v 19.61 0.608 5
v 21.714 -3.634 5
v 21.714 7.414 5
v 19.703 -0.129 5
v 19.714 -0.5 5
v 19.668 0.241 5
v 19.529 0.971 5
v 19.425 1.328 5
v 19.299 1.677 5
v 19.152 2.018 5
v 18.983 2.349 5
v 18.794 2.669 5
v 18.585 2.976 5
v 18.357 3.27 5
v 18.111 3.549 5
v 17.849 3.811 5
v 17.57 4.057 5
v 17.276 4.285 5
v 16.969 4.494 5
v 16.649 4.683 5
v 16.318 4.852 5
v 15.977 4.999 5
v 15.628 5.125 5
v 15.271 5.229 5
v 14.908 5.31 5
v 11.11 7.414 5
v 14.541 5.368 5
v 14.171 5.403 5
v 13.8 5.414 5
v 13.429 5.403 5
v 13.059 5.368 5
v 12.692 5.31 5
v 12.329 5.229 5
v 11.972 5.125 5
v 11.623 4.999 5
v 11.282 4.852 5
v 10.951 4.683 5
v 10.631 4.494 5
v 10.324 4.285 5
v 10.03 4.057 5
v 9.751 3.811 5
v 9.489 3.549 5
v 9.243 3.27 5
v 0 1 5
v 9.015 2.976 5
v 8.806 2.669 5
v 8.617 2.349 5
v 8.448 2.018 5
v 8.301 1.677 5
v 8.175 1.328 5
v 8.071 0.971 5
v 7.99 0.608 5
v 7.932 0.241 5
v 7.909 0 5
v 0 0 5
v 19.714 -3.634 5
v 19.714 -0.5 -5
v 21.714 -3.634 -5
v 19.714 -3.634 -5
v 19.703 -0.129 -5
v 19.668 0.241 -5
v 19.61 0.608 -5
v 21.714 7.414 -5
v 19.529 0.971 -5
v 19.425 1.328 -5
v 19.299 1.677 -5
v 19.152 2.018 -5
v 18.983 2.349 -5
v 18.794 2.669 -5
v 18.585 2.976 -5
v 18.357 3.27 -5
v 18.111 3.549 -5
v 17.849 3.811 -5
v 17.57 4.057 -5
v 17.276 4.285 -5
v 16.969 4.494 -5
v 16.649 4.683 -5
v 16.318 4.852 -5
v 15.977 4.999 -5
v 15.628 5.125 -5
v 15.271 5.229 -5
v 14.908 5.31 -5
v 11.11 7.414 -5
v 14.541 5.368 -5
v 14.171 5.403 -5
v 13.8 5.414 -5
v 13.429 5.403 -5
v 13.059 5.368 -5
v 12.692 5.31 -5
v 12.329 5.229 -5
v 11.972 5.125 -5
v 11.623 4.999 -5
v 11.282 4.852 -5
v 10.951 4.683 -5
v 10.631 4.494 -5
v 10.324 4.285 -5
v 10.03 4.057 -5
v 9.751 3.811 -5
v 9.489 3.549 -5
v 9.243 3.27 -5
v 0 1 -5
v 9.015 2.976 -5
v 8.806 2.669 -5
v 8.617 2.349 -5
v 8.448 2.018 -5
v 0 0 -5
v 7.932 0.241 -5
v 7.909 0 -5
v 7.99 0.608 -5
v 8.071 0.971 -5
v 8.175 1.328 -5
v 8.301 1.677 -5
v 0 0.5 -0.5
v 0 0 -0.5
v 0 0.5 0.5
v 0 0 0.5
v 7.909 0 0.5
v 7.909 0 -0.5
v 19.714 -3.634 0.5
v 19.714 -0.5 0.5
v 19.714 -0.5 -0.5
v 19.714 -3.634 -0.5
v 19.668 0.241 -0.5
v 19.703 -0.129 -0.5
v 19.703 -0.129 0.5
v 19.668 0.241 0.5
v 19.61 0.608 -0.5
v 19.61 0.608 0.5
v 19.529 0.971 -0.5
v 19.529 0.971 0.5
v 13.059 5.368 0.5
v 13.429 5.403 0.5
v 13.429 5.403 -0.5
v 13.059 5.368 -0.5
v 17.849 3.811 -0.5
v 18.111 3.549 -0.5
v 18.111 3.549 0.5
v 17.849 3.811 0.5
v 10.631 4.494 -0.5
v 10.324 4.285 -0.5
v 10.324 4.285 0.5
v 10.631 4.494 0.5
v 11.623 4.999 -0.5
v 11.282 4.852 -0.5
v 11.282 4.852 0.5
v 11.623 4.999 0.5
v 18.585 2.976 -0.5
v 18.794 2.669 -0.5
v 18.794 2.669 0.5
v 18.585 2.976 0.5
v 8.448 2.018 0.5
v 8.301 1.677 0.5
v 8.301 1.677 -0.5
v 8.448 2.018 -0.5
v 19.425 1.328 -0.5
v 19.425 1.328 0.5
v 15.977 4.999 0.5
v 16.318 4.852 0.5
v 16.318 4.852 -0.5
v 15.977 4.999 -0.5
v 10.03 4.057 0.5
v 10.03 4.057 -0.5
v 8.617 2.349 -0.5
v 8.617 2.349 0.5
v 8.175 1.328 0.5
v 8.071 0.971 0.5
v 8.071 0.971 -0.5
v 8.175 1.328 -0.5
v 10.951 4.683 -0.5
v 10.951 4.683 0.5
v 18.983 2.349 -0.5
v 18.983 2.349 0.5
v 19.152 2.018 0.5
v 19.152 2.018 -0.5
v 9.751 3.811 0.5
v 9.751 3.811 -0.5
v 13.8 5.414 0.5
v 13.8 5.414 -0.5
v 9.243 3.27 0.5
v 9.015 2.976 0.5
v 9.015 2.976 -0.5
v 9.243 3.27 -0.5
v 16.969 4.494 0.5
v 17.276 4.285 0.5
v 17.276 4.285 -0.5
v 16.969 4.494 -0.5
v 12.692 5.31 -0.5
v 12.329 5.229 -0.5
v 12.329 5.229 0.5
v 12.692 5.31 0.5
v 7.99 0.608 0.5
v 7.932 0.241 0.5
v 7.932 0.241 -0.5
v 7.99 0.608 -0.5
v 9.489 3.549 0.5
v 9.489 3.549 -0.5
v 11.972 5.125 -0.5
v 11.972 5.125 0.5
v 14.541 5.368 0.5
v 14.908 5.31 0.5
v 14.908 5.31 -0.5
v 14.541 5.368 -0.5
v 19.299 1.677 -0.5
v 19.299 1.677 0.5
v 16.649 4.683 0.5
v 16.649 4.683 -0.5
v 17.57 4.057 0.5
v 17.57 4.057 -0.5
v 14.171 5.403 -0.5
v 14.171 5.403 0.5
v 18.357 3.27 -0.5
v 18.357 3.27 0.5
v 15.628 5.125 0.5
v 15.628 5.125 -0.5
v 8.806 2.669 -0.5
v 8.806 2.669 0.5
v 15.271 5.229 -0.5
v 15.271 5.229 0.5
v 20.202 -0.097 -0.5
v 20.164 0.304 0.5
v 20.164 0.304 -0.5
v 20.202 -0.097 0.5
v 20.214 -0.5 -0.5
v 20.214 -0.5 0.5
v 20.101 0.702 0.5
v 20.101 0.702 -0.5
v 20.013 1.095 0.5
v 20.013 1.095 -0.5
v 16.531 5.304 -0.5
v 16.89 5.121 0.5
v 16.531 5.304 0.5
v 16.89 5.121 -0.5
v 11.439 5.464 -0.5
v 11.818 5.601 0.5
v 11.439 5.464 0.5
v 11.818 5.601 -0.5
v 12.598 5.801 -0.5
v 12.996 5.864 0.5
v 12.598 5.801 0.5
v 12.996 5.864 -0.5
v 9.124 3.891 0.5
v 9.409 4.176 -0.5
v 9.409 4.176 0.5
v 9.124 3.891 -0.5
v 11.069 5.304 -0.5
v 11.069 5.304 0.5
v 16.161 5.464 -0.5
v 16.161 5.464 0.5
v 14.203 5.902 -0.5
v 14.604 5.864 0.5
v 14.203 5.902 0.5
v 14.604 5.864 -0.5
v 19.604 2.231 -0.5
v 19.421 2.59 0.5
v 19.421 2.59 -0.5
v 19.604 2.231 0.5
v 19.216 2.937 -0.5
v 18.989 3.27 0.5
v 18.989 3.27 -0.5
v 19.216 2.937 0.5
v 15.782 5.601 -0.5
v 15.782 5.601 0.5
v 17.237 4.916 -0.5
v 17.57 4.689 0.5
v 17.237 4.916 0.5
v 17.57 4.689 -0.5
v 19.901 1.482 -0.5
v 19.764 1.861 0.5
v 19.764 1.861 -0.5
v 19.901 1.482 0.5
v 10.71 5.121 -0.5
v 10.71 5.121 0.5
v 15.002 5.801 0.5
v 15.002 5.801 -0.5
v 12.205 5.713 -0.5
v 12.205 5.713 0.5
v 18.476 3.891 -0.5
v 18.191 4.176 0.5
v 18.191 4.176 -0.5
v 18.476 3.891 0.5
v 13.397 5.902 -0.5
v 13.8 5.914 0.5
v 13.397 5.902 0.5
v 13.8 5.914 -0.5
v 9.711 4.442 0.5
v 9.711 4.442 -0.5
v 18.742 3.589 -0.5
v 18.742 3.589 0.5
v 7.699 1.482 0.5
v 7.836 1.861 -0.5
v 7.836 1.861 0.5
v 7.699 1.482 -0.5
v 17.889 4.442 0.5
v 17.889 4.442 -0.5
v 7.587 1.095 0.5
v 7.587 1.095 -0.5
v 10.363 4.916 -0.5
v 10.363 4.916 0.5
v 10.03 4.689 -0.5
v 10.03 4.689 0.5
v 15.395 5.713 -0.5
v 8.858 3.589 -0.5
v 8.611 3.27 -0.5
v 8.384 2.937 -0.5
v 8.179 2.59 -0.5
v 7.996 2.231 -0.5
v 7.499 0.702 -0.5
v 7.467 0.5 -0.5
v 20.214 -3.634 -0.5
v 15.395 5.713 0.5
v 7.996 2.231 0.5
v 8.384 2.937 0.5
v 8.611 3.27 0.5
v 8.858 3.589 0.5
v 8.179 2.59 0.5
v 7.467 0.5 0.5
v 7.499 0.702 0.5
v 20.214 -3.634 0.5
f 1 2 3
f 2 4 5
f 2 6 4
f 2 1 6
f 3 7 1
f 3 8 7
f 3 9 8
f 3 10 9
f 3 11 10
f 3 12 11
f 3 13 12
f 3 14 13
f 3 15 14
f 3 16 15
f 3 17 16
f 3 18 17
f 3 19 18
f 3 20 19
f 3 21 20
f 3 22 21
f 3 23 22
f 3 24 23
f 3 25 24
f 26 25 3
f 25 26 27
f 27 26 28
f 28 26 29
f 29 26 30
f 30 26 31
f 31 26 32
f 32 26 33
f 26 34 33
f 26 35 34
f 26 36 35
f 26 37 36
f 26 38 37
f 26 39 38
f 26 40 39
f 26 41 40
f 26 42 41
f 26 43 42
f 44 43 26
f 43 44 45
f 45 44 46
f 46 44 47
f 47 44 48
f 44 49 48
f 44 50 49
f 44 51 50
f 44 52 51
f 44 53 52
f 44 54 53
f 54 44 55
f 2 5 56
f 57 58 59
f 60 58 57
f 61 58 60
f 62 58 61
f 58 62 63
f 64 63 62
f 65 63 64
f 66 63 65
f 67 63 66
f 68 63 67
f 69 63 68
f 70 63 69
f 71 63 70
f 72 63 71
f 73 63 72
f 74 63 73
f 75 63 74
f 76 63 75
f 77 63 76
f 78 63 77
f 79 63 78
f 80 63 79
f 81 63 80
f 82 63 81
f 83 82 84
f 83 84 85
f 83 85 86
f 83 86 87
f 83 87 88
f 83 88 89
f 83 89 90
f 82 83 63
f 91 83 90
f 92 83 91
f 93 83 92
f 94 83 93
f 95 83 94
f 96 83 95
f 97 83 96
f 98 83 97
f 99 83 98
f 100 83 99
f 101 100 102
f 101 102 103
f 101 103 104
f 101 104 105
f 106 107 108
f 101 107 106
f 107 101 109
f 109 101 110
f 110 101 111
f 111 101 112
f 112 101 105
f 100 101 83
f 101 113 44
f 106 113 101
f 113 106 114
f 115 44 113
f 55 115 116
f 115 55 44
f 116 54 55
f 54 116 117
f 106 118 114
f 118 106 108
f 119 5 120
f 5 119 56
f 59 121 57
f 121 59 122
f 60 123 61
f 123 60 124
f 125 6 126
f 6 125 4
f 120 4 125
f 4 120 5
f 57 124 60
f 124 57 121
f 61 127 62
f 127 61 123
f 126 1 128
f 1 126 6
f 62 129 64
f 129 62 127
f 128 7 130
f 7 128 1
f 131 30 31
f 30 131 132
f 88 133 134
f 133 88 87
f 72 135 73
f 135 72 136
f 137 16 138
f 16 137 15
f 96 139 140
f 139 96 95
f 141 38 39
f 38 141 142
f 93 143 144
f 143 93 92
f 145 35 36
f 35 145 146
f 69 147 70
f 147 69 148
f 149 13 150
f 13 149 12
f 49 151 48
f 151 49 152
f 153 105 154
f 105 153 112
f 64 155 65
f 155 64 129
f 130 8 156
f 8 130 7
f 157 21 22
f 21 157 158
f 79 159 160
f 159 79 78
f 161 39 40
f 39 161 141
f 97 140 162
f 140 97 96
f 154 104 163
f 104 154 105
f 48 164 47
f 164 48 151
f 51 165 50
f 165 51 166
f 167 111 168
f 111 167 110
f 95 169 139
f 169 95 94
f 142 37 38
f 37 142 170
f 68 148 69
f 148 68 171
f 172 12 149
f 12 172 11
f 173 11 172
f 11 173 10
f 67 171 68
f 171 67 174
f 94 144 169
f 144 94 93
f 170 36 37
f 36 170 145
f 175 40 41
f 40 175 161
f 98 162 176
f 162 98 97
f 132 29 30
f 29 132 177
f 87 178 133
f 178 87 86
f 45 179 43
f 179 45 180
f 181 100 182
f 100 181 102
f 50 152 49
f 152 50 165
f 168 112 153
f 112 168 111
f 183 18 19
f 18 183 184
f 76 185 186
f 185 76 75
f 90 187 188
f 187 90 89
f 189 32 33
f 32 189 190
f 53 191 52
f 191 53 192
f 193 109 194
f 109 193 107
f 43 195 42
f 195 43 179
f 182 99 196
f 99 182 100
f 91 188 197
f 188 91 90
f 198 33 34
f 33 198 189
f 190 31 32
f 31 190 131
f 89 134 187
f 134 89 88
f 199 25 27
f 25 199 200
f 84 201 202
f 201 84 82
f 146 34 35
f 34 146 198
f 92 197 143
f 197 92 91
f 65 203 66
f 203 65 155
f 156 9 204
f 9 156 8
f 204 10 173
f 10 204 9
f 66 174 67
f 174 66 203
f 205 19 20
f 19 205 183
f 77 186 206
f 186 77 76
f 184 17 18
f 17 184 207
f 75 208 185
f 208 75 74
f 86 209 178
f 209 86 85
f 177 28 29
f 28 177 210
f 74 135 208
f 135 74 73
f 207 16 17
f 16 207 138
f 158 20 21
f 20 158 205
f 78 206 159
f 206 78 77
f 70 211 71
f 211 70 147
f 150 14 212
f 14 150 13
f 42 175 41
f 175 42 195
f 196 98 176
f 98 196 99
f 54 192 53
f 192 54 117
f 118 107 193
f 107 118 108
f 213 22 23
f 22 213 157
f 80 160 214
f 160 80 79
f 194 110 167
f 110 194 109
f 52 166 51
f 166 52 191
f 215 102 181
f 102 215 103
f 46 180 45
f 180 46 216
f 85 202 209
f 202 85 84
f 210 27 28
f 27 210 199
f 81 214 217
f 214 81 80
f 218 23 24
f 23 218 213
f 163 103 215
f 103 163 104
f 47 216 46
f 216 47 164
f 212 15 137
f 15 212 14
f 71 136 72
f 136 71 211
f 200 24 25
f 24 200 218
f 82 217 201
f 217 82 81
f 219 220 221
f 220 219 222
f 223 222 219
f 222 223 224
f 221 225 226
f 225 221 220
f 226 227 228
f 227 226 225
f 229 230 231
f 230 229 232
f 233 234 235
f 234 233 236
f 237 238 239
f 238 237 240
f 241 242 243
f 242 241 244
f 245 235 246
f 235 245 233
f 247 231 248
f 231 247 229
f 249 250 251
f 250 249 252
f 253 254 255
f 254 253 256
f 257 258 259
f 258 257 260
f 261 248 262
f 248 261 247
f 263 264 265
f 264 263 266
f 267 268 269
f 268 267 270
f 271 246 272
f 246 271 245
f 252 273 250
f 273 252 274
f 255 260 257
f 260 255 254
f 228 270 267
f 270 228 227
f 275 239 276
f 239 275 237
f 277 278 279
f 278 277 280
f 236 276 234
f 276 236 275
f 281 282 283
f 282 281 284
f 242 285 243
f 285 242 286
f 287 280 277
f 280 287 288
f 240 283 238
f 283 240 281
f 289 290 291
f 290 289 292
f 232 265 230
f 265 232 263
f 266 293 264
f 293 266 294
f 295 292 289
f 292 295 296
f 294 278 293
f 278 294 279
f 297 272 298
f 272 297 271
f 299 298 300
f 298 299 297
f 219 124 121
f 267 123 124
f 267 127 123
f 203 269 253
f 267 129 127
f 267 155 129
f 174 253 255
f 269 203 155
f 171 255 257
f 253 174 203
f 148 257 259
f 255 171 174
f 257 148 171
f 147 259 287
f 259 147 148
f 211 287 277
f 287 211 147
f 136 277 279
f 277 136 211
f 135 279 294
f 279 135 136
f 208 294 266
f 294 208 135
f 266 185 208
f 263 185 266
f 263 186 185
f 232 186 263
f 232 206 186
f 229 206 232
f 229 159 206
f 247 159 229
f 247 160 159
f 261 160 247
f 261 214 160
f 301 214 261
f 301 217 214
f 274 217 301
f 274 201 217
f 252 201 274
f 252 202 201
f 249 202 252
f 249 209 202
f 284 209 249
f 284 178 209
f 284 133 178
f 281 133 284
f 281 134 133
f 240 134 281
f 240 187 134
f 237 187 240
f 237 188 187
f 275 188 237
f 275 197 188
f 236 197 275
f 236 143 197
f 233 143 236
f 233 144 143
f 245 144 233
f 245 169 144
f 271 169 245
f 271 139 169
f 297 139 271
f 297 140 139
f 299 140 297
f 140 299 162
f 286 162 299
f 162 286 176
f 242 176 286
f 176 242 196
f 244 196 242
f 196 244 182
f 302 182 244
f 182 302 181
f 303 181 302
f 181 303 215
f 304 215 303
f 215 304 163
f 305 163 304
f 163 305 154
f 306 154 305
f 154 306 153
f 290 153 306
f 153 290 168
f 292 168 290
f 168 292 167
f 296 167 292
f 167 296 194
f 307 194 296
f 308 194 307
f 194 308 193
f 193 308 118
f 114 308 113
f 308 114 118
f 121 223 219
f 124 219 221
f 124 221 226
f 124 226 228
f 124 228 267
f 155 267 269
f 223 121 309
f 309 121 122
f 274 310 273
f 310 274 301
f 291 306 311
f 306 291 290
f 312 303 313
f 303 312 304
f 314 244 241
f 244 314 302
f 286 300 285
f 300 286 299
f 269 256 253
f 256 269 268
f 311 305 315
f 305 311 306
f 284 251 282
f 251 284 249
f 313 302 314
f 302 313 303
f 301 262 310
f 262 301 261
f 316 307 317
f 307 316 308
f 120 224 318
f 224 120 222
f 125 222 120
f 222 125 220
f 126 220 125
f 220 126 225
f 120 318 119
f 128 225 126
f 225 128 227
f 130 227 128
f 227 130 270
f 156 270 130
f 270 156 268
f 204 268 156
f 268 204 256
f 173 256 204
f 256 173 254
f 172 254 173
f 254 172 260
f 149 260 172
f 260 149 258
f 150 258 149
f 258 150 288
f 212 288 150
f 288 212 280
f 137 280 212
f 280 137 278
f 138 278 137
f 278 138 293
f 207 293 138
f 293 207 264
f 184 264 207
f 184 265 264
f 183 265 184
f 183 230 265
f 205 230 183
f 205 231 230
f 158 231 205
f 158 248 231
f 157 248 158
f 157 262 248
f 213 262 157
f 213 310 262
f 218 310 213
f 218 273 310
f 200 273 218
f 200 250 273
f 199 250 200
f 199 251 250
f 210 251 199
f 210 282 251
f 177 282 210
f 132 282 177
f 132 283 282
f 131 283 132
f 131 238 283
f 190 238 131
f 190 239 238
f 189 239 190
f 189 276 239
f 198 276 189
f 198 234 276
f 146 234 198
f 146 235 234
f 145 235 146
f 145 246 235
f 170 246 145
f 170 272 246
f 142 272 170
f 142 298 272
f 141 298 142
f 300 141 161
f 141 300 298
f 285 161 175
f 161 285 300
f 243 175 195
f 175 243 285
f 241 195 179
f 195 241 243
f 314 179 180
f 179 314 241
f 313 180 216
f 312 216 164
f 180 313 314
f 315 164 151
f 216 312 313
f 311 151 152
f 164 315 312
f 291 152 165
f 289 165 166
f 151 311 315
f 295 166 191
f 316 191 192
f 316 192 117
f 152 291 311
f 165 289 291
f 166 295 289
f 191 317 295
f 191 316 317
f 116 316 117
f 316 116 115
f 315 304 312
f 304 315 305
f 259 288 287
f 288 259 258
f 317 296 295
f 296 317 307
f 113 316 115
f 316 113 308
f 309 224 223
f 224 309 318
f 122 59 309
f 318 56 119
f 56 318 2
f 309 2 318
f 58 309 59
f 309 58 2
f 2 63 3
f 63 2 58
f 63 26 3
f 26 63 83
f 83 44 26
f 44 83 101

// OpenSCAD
pliure  = 5;        // distance pour la pliure
fil     = 0.5;      // épaisseur des pattes
ecart   = 3;        // écart entre les pattes
anode   = 29.6;     // longueur de l'anode
cathode = 28.1;     // longueur de la cathode
espace  = 16.5;     // espace entre les leds
led     = 5.4;      // auteur de la led


//----------------------------------------------------------------------------------
// ICI C'EST LE PROGRAMME QUI GÈRE
//----------------------------------------------------------------------------------

//plieur1();

module plieur1() {
    difference() {
        // masse principale
        cube([anode,anode+2*ecart-pliure,pliure+fil]);
        
        // passage pattes verticale
        translate([ecart*2,ecart*2,0]) cube([fil*2,fil*2,10]);;
        translate([ecart*3,ecart*2,0]) cube([fil*2,fil*2,10]);;
        
        // guide pattes horizontales
        translate([ecart*3,ecart*2,pliure]) 
        cube([fil*2,anode-pliure,fil*2]);

        // guide pattes diagonale
        translate([ecart*3,ecart*2,pliure]) 
        rotate([0,0,-45])
        translate([-fil,fil,0])
        cube([fil*2,anode,fil*2]);
     }
 }
 
 module plieur2() {
    difference() {
        // masse principale
        cube([anode,anode+2*ecart-pliure,pliure+fil]);
        
        // passage pattes verticale
        translate([ecart*2,ecart*2,0]) cube([fil*2,fil*2,10]);;
        translate([ecart*3,ecart*2,0]) cube([fil*2,fil*2,10]);;
        
        // guide pattes horizontales
        translate([ecart*3,ecart*2,pliure]) 
        cube([fil*2,anode-pliure,fil*2]);

        // guide pattes diagonale
        translate([ecart*3,ecart*2,pliure]) 
        rotate([0,0,-45])
        translate([-fil,fil,0])
        cube([fil*2,anode,fil*2]);
        
        // coupe 
        cube([anode,2*ecart,pliure+fil]);
     }
 }
 

pi    = 3.14159265359;
marge = 3.13363;
rayon = (anode-marge-espace+led/2)/(pi-1);
reste =  espace - rayon - led/2;
epais = 10;

$fn = 100;

negatif();
//positif();
//fil();
 

module negatif() {
    difference() {
        translate([0,-marge-fil,-epais/2])
        cube([reste+2*rayon+4*fil,rayon+4*fil+marge,epais]);
        translate([0,-2*marge-fil,-epais/2])
        cube([reste+2*rayon,2*marge,epais]);
        translate([0,1,-epais/2])
        rotate([0,0,30])
        cube([anode,2*marge,epais]);
        positif();
        fil();
    }
}

module fil() {
    translate([0,-fil,-fil])
    union() {
        // partie principale
        cube([reste,fil*2,fil*2]);
        
        // partie arrondie
        translate([reste+rayon,0,0])
        difference() {
            cylinder(fil*2,rayon+fil,rayon+fil);    
            cylinder(fil*2,rayon-fil,rayon-fil);
            translate([-rayon-fil,-rayon-fil,0])
            cube([2*(rayon+fil),rayon+fil,2*fil]);
            }
       
            
       // marge pour accroche
       translate([reste+2*rayon-fil,-marge,0])
       cube([2*fil,marge,fil*2]);
    }
}

module positif(){
    difference() {
    translate([0,0,-epais/2])
    difference() {
        union() {
            translate([0,-marge-fil,0])
            cube([reste+rayon,marge+fil,epais]);
            translate([reste+rayon,-marge-2*fil,0])
            cube([rayon,marge+fil,epais]);
            translate([reste+rayon,-fil,0])
            cylinder(epais,rayon,rayon);
        }
        translate([0,-2.5*marge-fil,0])
        cube([reste+2*rayon,2*marge,epais]);
    }
    fil();
    }
}
